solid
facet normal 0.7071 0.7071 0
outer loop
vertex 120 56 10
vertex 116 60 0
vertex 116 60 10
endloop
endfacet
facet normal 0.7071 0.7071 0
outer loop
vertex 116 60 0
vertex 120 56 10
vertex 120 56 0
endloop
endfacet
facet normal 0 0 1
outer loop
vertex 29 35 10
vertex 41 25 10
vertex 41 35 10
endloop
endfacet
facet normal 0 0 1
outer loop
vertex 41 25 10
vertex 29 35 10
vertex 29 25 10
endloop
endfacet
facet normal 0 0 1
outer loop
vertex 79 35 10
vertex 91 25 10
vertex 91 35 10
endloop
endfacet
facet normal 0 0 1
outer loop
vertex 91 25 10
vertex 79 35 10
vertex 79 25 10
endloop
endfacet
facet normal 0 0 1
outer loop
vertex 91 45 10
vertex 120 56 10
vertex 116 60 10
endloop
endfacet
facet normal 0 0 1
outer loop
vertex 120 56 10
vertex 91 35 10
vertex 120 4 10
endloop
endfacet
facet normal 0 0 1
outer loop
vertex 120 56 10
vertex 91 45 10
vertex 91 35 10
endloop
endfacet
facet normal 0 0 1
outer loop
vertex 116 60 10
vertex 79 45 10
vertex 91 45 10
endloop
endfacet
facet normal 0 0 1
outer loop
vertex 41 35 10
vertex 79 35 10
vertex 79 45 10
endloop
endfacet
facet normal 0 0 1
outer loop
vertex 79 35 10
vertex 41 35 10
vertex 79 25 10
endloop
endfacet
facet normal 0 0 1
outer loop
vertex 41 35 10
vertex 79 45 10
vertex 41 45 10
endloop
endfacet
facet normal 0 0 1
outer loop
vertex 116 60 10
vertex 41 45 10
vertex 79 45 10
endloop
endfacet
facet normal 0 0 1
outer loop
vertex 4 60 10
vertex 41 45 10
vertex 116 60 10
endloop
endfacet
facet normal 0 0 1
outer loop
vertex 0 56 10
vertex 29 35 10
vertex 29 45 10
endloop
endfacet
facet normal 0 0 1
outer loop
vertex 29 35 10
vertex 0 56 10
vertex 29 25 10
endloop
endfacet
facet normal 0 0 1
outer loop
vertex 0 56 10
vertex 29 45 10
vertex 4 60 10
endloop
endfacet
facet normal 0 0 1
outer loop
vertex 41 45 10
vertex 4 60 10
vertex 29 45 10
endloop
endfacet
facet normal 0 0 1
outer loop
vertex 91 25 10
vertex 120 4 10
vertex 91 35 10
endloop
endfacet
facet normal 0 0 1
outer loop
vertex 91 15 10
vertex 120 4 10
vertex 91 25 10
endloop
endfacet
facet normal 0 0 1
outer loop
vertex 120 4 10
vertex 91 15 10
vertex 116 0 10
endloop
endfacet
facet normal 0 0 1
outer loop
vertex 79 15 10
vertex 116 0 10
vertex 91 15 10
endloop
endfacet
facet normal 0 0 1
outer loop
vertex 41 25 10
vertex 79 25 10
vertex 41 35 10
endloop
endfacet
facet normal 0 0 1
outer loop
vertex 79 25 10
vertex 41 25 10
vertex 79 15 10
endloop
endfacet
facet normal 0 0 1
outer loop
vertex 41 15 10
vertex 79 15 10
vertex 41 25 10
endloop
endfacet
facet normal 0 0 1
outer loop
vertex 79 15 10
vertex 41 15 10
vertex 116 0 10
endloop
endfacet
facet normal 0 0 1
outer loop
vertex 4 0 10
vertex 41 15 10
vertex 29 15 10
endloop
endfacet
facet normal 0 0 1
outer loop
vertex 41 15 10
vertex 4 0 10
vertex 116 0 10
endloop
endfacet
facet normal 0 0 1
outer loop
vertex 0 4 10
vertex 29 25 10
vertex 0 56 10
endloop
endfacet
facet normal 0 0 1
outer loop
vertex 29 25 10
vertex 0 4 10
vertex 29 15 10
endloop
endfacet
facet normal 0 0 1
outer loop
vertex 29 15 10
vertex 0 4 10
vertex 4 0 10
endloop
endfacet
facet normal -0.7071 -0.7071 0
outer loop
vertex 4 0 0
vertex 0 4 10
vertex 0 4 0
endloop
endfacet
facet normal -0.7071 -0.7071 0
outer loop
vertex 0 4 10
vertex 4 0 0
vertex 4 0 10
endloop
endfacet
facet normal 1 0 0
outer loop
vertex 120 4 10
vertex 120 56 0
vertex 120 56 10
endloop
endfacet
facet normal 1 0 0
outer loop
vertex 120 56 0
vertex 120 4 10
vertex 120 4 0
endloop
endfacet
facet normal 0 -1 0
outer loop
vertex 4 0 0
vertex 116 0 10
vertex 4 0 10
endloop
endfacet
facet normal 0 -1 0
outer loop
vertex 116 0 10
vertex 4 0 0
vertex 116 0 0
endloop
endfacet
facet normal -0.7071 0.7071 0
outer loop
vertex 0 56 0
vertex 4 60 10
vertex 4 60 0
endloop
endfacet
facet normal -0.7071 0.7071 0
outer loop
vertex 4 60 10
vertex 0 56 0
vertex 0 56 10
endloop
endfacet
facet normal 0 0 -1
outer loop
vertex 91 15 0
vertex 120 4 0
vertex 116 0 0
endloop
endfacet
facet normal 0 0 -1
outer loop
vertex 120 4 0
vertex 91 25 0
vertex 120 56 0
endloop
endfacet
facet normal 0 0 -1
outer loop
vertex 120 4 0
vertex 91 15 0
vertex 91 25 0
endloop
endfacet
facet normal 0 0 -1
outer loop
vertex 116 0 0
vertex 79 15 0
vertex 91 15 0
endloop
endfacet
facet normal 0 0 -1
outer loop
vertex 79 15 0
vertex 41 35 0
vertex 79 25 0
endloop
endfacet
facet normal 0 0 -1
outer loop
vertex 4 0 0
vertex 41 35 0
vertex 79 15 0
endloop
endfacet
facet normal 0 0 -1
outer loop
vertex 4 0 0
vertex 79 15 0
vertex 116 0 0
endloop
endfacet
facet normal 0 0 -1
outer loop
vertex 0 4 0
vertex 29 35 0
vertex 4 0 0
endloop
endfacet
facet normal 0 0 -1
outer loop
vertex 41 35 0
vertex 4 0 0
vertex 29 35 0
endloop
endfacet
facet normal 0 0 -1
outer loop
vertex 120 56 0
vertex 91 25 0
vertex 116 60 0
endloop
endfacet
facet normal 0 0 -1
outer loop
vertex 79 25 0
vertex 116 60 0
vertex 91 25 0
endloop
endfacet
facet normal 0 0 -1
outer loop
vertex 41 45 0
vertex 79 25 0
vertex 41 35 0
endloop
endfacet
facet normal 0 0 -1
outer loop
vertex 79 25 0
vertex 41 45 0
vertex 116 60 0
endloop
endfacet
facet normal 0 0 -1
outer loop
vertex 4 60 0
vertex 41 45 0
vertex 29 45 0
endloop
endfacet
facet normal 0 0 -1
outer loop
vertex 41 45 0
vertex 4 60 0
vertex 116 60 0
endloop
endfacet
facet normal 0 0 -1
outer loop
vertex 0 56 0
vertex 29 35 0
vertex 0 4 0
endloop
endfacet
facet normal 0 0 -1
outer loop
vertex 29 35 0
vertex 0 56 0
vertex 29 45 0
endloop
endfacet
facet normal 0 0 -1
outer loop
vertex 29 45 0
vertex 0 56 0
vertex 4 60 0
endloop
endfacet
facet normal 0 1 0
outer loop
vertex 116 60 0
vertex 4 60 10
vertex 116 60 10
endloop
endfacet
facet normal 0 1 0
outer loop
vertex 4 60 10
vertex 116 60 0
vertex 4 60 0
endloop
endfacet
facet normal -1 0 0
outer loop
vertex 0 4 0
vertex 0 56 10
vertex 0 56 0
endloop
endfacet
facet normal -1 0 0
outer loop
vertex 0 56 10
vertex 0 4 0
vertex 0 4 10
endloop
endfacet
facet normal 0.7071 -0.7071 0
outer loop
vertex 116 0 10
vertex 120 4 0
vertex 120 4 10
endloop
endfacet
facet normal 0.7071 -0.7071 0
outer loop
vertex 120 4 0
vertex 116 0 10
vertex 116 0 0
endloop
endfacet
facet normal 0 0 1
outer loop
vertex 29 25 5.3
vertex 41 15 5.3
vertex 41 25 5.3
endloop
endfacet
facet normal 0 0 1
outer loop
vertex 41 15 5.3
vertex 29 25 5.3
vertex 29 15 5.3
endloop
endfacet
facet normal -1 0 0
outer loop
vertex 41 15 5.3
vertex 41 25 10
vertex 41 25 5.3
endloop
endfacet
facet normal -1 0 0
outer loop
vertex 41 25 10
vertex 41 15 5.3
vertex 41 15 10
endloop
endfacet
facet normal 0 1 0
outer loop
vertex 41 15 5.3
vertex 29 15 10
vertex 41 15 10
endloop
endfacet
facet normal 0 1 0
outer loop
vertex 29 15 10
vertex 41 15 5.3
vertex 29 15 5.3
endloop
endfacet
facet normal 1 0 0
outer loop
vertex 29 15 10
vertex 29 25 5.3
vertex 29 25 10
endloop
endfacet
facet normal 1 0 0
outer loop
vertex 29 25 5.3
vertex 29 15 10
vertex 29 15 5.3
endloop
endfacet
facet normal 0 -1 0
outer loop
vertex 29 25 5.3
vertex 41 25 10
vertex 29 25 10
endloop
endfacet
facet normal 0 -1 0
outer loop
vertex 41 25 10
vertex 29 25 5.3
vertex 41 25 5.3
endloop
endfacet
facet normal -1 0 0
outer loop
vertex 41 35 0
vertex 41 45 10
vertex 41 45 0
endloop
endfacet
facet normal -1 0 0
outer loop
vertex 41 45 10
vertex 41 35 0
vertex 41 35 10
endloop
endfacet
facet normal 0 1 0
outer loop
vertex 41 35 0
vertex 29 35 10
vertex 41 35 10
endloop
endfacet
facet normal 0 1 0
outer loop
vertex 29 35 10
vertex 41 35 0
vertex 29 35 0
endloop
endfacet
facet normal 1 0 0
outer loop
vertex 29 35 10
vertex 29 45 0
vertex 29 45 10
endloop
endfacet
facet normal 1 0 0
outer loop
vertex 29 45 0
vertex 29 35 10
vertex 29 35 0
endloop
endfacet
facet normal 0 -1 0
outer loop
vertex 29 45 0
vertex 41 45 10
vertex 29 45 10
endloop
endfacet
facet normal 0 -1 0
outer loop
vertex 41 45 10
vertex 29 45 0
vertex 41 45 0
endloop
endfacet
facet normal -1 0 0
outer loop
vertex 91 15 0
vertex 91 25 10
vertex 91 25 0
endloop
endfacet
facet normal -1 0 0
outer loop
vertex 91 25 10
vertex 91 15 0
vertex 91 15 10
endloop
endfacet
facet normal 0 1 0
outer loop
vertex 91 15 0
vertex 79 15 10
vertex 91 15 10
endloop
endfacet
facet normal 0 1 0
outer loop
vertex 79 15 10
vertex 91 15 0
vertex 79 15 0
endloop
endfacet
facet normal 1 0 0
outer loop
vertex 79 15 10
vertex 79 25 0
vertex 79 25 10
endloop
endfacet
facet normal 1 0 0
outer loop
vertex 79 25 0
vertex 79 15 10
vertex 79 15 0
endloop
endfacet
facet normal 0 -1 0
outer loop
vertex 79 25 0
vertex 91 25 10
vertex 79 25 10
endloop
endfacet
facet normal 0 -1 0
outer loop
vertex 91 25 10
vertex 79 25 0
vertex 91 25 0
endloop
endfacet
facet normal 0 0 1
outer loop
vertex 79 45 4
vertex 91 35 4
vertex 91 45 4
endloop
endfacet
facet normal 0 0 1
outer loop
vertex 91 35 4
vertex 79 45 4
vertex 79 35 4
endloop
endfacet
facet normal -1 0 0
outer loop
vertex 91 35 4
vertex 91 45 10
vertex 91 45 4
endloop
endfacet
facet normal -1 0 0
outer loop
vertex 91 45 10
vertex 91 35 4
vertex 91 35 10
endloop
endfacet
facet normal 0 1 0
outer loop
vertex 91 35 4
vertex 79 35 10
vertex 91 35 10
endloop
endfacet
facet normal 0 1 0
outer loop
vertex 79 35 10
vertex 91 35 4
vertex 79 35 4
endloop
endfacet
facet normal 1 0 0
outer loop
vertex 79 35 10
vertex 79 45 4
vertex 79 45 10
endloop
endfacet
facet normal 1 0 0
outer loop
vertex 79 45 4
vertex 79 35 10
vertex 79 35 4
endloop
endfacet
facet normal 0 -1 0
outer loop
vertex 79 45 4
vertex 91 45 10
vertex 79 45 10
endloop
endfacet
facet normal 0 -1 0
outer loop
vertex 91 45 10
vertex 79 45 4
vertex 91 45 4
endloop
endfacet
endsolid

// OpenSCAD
$fn = 32;

// ----------------------------------------------------------------------
// Windowed plate: 4 voids, 120 x 60 x 10 mm
// ----------------------------------------------------------------------

// --- parameters (mm) ---
plate_l = 120;            // plate length, X
plate_w = 60;             // plate width, Y
plate_t = 10;             // plate thickness, Z
edge_margin = 10;         // wall from the plate edge to any window
win_l = 12;               // pocket length
win_w = 10;               // pocket width
pitch_x = 50;             // grid pitch along X
pitch_y = 20;             // grid pitch along Y
depth_1 = 4.7;            // depth of void 1 (full thickness = through)
depth_2 = 10;             // depth of void 2 (full thickness = through)
depth_3 = 10;             // depth of void 3 (full thickness = through)
depth_4 = 6;              // depth of void 4 (full thickness = through)
corner_c = 4;             // corner chamfer of the plate

profile = [[4, 0], [116, 0], [120, 4], [120, 56], [116, 60], [4, 60], [0, 56], [0, 4]];  // primary outline, 8 points, counter clockwise
void_1 = [[29, 15], [41, 15], [41, 25], [29, 25]];  // pocket at grid node 0,0, 4 points
void_2 = [[29, 35], [41, 35], [41, 45], [29, 45]];  // pocket at grid node 0,1, 4 points
void_3 = [[79, 15], [91, 15], [91, 25], [79, 25]];  // pocket at grid node 1,0, 4 points
void_4 = [[79, 35], [91, 35], [91, 45], [79, 45]];  // pocket at grid node 1,1, 4 points

// --- the one profile operation ---
difference() {
  linear_extrude(height = plate_t) polygon(points = profile);
  translate([0, 0, plate_t - depth_1])
    linear_extrude(height = depth_1 + 1) polygon(points = void_1);
  translate([0, 0, -1])
    linear_extrude(height = plate_t + 2) polygon(points = void_2);
  translate([0, 0, -1])
    linear_extrude(height = plate_t + 2) polygon(points = void_3);
  translate([0, 0, plate_t - depth_4])
    linear_extrude(height = depth_4 + 1) polygon(points = void_4);
}
